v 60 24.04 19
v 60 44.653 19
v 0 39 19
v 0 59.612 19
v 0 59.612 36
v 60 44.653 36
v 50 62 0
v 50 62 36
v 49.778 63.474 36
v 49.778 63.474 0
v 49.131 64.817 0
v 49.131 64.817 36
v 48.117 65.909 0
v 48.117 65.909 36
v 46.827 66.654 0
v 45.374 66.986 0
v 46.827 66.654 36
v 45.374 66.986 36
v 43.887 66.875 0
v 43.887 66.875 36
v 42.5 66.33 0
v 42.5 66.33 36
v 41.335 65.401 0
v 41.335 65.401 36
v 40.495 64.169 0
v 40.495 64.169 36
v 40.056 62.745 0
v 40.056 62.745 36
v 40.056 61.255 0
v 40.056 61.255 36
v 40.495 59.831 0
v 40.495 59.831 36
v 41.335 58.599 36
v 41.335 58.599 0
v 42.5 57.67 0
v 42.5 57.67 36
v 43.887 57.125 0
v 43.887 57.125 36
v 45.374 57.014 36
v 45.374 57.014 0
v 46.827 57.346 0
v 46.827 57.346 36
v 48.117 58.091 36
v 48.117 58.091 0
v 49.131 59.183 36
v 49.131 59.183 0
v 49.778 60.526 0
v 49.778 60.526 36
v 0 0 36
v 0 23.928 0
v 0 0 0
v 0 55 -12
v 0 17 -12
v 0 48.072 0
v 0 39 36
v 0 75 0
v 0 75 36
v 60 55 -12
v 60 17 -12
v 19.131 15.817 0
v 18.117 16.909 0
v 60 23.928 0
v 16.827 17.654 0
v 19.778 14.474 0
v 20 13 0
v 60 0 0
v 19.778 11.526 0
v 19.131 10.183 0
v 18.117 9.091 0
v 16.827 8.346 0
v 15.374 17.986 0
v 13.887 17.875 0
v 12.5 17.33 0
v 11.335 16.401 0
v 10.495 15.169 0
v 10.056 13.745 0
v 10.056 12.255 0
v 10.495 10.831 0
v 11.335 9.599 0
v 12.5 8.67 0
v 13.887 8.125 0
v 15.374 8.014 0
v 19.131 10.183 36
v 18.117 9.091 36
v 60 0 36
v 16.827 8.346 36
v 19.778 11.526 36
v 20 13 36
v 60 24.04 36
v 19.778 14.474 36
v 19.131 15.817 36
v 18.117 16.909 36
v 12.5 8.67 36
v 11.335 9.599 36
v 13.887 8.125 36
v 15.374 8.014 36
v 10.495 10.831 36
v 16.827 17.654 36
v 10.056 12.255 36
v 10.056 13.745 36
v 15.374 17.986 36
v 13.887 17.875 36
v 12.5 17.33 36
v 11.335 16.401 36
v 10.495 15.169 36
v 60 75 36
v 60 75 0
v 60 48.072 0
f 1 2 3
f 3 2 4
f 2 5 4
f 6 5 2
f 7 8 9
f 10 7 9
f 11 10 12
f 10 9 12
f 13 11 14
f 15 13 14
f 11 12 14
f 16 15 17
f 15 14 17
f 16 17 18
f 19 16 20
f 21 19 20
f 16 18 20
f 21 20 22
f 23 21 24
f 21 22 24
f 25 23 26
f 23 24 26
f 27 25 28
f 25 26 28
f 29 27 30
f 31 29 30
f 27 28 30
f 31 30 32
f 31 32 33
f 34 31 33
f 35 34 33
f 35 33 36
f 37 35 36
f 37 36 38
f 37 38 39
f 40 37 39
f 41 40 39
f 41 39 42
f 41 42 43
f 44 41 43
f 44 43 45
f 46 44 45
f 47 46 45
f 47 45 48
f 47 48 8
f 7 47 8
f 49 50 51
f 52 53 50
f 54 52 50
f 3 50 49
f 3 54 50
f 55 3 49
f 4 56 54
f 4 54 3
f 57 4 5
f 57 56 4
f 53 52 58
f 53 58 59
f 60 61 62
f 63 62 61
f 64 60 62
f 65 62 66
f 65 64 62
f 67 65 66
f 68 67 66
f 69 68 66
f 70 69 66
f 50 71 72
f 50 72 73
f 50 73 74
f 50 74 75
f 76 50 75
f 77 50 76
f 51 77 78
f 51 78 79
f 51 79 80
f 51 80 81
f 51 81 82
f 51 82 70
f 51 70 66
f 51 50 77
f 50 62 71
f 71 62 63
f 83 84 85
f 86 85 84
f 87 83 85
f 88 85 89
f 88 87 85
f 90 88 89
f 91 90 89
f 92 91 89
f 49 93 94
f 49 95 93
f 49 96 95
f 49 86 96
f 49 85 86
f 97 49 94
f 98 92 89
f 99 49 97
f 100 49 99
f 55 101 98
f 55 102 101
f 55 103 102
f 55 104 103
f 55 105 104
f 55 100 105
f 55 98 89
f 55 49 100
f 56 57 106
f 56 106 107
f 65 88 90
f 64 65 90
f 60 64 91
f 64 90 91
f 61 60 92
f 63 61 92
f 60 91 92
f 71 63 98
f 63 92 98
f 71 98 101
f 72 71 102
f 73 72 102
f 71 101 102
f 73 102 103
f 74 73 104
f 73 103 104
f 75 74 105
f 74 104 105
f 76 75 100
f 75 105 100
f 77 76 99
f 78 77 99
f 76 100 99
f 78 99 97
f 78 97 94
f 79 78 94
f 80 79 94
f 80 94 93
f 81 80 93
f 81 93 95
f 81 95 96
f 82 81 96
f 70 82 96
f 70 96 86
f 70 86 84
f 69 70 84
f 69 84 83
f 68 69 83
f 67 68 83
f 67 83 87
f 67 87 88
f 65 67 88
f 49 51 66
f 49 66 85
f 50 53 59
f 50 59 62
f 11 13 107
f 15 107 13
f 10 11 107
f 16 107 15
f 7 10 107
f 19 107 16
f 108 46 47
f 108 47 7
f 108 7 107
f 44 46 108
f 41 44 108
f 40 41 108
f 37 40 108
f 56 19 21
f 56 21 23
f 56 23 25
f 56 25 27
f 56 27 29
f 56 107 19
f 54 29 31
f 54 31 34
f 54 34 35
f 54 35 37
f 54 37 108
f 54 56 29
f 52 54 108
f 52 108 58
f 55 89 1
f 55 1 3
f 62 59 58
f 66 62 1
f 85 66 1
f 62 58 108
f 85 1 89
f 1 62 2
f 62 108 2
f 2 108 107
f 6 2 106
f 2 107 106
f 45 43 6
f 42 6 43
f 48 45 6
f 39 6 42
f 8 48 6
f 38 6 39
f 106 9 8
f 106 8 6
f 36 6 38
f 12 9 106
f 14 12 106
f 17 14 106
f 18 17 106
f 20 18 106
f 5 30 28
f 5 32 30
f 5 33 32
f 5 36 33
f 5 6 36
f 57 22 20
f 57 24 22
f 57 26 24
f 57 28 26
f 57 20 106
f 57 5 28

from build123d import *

# Parameters (mm, degrees)
BOSS_EXTRUDE1_DEPTH = 60
CUT_EXTRUDE1_DEPTH  = 17
CUT_EXTRUDE2_REACH  = 109.373
SKETCH4_R           = 5


with BuildPart() as part:
    # Sketch1 → Boss-Extrude1 (new body)
    with BuildSketch(Plane(origin=(0, 0, 0), x_dir=(0, 0, -1), z_dir=(1, 0, 0))):
        Polygon((-36, 75), (0, 75), (0, 48.07179677), (12, 55), (12, 17), (0, 23.92820323), (0, 0), (-36, 0), align=None)
    extrude(amount=BOSS_EXTRUDE1_DEPTH)

    # Sketch2 → Cut-Extrude1 (cut)
    with BuildSketch(Plane.XY.offset(36)):
        Polygon((0, 59.612272587), (60, 44.652592416), (60, 24.040319829), (0, 39), align=None)
    extrude(amount=-CUT_EXTRUDE1_DEPTH, mode=Mode.SUBTRACT)

    # Sketch4 → Cut-Extrude2 (cut, up to next)
    with BuildSketch(Plane.XY.offset(36), mode=Mode.PRIVATE) as cut_extrude2_sk1:
        with Locations((45, 62)):
            Circle(SKETCH4_R)
    cut_extrude2_tool1 = extrude(cut_extrude2_sk1.sketch, amount=-CUT_EXTRUDE2_REACH, mode=Mode.PRIVATE) & part.part
    # Sketch4 → Cut-Extrude2 (cut, up to next)
    with BuildSketch(Plane.XY.offset(36), mode=Mode.PRIVATE) as cut_extrude2_sk2:
        with Locations((15, 13)):
            Circle(SKETCH4_R)
    cut_extrude2_tool2 = extrude(cut_extrude2_sk2.sketch, amount=-CUT_EXTRUDE2_REACH, mode=Mode.PRIVATE) & part.part
    add(cut_extrude2_tool1.solids().sort_by_distance((45, 62, 36))[0], mode=Mode.SUBTRACT)
    add(cut_extrude2_tool2.solids().sort_by_distance((15, 13, 36))[0], mode=Mode.SUBTRACT)


solid = part.part
